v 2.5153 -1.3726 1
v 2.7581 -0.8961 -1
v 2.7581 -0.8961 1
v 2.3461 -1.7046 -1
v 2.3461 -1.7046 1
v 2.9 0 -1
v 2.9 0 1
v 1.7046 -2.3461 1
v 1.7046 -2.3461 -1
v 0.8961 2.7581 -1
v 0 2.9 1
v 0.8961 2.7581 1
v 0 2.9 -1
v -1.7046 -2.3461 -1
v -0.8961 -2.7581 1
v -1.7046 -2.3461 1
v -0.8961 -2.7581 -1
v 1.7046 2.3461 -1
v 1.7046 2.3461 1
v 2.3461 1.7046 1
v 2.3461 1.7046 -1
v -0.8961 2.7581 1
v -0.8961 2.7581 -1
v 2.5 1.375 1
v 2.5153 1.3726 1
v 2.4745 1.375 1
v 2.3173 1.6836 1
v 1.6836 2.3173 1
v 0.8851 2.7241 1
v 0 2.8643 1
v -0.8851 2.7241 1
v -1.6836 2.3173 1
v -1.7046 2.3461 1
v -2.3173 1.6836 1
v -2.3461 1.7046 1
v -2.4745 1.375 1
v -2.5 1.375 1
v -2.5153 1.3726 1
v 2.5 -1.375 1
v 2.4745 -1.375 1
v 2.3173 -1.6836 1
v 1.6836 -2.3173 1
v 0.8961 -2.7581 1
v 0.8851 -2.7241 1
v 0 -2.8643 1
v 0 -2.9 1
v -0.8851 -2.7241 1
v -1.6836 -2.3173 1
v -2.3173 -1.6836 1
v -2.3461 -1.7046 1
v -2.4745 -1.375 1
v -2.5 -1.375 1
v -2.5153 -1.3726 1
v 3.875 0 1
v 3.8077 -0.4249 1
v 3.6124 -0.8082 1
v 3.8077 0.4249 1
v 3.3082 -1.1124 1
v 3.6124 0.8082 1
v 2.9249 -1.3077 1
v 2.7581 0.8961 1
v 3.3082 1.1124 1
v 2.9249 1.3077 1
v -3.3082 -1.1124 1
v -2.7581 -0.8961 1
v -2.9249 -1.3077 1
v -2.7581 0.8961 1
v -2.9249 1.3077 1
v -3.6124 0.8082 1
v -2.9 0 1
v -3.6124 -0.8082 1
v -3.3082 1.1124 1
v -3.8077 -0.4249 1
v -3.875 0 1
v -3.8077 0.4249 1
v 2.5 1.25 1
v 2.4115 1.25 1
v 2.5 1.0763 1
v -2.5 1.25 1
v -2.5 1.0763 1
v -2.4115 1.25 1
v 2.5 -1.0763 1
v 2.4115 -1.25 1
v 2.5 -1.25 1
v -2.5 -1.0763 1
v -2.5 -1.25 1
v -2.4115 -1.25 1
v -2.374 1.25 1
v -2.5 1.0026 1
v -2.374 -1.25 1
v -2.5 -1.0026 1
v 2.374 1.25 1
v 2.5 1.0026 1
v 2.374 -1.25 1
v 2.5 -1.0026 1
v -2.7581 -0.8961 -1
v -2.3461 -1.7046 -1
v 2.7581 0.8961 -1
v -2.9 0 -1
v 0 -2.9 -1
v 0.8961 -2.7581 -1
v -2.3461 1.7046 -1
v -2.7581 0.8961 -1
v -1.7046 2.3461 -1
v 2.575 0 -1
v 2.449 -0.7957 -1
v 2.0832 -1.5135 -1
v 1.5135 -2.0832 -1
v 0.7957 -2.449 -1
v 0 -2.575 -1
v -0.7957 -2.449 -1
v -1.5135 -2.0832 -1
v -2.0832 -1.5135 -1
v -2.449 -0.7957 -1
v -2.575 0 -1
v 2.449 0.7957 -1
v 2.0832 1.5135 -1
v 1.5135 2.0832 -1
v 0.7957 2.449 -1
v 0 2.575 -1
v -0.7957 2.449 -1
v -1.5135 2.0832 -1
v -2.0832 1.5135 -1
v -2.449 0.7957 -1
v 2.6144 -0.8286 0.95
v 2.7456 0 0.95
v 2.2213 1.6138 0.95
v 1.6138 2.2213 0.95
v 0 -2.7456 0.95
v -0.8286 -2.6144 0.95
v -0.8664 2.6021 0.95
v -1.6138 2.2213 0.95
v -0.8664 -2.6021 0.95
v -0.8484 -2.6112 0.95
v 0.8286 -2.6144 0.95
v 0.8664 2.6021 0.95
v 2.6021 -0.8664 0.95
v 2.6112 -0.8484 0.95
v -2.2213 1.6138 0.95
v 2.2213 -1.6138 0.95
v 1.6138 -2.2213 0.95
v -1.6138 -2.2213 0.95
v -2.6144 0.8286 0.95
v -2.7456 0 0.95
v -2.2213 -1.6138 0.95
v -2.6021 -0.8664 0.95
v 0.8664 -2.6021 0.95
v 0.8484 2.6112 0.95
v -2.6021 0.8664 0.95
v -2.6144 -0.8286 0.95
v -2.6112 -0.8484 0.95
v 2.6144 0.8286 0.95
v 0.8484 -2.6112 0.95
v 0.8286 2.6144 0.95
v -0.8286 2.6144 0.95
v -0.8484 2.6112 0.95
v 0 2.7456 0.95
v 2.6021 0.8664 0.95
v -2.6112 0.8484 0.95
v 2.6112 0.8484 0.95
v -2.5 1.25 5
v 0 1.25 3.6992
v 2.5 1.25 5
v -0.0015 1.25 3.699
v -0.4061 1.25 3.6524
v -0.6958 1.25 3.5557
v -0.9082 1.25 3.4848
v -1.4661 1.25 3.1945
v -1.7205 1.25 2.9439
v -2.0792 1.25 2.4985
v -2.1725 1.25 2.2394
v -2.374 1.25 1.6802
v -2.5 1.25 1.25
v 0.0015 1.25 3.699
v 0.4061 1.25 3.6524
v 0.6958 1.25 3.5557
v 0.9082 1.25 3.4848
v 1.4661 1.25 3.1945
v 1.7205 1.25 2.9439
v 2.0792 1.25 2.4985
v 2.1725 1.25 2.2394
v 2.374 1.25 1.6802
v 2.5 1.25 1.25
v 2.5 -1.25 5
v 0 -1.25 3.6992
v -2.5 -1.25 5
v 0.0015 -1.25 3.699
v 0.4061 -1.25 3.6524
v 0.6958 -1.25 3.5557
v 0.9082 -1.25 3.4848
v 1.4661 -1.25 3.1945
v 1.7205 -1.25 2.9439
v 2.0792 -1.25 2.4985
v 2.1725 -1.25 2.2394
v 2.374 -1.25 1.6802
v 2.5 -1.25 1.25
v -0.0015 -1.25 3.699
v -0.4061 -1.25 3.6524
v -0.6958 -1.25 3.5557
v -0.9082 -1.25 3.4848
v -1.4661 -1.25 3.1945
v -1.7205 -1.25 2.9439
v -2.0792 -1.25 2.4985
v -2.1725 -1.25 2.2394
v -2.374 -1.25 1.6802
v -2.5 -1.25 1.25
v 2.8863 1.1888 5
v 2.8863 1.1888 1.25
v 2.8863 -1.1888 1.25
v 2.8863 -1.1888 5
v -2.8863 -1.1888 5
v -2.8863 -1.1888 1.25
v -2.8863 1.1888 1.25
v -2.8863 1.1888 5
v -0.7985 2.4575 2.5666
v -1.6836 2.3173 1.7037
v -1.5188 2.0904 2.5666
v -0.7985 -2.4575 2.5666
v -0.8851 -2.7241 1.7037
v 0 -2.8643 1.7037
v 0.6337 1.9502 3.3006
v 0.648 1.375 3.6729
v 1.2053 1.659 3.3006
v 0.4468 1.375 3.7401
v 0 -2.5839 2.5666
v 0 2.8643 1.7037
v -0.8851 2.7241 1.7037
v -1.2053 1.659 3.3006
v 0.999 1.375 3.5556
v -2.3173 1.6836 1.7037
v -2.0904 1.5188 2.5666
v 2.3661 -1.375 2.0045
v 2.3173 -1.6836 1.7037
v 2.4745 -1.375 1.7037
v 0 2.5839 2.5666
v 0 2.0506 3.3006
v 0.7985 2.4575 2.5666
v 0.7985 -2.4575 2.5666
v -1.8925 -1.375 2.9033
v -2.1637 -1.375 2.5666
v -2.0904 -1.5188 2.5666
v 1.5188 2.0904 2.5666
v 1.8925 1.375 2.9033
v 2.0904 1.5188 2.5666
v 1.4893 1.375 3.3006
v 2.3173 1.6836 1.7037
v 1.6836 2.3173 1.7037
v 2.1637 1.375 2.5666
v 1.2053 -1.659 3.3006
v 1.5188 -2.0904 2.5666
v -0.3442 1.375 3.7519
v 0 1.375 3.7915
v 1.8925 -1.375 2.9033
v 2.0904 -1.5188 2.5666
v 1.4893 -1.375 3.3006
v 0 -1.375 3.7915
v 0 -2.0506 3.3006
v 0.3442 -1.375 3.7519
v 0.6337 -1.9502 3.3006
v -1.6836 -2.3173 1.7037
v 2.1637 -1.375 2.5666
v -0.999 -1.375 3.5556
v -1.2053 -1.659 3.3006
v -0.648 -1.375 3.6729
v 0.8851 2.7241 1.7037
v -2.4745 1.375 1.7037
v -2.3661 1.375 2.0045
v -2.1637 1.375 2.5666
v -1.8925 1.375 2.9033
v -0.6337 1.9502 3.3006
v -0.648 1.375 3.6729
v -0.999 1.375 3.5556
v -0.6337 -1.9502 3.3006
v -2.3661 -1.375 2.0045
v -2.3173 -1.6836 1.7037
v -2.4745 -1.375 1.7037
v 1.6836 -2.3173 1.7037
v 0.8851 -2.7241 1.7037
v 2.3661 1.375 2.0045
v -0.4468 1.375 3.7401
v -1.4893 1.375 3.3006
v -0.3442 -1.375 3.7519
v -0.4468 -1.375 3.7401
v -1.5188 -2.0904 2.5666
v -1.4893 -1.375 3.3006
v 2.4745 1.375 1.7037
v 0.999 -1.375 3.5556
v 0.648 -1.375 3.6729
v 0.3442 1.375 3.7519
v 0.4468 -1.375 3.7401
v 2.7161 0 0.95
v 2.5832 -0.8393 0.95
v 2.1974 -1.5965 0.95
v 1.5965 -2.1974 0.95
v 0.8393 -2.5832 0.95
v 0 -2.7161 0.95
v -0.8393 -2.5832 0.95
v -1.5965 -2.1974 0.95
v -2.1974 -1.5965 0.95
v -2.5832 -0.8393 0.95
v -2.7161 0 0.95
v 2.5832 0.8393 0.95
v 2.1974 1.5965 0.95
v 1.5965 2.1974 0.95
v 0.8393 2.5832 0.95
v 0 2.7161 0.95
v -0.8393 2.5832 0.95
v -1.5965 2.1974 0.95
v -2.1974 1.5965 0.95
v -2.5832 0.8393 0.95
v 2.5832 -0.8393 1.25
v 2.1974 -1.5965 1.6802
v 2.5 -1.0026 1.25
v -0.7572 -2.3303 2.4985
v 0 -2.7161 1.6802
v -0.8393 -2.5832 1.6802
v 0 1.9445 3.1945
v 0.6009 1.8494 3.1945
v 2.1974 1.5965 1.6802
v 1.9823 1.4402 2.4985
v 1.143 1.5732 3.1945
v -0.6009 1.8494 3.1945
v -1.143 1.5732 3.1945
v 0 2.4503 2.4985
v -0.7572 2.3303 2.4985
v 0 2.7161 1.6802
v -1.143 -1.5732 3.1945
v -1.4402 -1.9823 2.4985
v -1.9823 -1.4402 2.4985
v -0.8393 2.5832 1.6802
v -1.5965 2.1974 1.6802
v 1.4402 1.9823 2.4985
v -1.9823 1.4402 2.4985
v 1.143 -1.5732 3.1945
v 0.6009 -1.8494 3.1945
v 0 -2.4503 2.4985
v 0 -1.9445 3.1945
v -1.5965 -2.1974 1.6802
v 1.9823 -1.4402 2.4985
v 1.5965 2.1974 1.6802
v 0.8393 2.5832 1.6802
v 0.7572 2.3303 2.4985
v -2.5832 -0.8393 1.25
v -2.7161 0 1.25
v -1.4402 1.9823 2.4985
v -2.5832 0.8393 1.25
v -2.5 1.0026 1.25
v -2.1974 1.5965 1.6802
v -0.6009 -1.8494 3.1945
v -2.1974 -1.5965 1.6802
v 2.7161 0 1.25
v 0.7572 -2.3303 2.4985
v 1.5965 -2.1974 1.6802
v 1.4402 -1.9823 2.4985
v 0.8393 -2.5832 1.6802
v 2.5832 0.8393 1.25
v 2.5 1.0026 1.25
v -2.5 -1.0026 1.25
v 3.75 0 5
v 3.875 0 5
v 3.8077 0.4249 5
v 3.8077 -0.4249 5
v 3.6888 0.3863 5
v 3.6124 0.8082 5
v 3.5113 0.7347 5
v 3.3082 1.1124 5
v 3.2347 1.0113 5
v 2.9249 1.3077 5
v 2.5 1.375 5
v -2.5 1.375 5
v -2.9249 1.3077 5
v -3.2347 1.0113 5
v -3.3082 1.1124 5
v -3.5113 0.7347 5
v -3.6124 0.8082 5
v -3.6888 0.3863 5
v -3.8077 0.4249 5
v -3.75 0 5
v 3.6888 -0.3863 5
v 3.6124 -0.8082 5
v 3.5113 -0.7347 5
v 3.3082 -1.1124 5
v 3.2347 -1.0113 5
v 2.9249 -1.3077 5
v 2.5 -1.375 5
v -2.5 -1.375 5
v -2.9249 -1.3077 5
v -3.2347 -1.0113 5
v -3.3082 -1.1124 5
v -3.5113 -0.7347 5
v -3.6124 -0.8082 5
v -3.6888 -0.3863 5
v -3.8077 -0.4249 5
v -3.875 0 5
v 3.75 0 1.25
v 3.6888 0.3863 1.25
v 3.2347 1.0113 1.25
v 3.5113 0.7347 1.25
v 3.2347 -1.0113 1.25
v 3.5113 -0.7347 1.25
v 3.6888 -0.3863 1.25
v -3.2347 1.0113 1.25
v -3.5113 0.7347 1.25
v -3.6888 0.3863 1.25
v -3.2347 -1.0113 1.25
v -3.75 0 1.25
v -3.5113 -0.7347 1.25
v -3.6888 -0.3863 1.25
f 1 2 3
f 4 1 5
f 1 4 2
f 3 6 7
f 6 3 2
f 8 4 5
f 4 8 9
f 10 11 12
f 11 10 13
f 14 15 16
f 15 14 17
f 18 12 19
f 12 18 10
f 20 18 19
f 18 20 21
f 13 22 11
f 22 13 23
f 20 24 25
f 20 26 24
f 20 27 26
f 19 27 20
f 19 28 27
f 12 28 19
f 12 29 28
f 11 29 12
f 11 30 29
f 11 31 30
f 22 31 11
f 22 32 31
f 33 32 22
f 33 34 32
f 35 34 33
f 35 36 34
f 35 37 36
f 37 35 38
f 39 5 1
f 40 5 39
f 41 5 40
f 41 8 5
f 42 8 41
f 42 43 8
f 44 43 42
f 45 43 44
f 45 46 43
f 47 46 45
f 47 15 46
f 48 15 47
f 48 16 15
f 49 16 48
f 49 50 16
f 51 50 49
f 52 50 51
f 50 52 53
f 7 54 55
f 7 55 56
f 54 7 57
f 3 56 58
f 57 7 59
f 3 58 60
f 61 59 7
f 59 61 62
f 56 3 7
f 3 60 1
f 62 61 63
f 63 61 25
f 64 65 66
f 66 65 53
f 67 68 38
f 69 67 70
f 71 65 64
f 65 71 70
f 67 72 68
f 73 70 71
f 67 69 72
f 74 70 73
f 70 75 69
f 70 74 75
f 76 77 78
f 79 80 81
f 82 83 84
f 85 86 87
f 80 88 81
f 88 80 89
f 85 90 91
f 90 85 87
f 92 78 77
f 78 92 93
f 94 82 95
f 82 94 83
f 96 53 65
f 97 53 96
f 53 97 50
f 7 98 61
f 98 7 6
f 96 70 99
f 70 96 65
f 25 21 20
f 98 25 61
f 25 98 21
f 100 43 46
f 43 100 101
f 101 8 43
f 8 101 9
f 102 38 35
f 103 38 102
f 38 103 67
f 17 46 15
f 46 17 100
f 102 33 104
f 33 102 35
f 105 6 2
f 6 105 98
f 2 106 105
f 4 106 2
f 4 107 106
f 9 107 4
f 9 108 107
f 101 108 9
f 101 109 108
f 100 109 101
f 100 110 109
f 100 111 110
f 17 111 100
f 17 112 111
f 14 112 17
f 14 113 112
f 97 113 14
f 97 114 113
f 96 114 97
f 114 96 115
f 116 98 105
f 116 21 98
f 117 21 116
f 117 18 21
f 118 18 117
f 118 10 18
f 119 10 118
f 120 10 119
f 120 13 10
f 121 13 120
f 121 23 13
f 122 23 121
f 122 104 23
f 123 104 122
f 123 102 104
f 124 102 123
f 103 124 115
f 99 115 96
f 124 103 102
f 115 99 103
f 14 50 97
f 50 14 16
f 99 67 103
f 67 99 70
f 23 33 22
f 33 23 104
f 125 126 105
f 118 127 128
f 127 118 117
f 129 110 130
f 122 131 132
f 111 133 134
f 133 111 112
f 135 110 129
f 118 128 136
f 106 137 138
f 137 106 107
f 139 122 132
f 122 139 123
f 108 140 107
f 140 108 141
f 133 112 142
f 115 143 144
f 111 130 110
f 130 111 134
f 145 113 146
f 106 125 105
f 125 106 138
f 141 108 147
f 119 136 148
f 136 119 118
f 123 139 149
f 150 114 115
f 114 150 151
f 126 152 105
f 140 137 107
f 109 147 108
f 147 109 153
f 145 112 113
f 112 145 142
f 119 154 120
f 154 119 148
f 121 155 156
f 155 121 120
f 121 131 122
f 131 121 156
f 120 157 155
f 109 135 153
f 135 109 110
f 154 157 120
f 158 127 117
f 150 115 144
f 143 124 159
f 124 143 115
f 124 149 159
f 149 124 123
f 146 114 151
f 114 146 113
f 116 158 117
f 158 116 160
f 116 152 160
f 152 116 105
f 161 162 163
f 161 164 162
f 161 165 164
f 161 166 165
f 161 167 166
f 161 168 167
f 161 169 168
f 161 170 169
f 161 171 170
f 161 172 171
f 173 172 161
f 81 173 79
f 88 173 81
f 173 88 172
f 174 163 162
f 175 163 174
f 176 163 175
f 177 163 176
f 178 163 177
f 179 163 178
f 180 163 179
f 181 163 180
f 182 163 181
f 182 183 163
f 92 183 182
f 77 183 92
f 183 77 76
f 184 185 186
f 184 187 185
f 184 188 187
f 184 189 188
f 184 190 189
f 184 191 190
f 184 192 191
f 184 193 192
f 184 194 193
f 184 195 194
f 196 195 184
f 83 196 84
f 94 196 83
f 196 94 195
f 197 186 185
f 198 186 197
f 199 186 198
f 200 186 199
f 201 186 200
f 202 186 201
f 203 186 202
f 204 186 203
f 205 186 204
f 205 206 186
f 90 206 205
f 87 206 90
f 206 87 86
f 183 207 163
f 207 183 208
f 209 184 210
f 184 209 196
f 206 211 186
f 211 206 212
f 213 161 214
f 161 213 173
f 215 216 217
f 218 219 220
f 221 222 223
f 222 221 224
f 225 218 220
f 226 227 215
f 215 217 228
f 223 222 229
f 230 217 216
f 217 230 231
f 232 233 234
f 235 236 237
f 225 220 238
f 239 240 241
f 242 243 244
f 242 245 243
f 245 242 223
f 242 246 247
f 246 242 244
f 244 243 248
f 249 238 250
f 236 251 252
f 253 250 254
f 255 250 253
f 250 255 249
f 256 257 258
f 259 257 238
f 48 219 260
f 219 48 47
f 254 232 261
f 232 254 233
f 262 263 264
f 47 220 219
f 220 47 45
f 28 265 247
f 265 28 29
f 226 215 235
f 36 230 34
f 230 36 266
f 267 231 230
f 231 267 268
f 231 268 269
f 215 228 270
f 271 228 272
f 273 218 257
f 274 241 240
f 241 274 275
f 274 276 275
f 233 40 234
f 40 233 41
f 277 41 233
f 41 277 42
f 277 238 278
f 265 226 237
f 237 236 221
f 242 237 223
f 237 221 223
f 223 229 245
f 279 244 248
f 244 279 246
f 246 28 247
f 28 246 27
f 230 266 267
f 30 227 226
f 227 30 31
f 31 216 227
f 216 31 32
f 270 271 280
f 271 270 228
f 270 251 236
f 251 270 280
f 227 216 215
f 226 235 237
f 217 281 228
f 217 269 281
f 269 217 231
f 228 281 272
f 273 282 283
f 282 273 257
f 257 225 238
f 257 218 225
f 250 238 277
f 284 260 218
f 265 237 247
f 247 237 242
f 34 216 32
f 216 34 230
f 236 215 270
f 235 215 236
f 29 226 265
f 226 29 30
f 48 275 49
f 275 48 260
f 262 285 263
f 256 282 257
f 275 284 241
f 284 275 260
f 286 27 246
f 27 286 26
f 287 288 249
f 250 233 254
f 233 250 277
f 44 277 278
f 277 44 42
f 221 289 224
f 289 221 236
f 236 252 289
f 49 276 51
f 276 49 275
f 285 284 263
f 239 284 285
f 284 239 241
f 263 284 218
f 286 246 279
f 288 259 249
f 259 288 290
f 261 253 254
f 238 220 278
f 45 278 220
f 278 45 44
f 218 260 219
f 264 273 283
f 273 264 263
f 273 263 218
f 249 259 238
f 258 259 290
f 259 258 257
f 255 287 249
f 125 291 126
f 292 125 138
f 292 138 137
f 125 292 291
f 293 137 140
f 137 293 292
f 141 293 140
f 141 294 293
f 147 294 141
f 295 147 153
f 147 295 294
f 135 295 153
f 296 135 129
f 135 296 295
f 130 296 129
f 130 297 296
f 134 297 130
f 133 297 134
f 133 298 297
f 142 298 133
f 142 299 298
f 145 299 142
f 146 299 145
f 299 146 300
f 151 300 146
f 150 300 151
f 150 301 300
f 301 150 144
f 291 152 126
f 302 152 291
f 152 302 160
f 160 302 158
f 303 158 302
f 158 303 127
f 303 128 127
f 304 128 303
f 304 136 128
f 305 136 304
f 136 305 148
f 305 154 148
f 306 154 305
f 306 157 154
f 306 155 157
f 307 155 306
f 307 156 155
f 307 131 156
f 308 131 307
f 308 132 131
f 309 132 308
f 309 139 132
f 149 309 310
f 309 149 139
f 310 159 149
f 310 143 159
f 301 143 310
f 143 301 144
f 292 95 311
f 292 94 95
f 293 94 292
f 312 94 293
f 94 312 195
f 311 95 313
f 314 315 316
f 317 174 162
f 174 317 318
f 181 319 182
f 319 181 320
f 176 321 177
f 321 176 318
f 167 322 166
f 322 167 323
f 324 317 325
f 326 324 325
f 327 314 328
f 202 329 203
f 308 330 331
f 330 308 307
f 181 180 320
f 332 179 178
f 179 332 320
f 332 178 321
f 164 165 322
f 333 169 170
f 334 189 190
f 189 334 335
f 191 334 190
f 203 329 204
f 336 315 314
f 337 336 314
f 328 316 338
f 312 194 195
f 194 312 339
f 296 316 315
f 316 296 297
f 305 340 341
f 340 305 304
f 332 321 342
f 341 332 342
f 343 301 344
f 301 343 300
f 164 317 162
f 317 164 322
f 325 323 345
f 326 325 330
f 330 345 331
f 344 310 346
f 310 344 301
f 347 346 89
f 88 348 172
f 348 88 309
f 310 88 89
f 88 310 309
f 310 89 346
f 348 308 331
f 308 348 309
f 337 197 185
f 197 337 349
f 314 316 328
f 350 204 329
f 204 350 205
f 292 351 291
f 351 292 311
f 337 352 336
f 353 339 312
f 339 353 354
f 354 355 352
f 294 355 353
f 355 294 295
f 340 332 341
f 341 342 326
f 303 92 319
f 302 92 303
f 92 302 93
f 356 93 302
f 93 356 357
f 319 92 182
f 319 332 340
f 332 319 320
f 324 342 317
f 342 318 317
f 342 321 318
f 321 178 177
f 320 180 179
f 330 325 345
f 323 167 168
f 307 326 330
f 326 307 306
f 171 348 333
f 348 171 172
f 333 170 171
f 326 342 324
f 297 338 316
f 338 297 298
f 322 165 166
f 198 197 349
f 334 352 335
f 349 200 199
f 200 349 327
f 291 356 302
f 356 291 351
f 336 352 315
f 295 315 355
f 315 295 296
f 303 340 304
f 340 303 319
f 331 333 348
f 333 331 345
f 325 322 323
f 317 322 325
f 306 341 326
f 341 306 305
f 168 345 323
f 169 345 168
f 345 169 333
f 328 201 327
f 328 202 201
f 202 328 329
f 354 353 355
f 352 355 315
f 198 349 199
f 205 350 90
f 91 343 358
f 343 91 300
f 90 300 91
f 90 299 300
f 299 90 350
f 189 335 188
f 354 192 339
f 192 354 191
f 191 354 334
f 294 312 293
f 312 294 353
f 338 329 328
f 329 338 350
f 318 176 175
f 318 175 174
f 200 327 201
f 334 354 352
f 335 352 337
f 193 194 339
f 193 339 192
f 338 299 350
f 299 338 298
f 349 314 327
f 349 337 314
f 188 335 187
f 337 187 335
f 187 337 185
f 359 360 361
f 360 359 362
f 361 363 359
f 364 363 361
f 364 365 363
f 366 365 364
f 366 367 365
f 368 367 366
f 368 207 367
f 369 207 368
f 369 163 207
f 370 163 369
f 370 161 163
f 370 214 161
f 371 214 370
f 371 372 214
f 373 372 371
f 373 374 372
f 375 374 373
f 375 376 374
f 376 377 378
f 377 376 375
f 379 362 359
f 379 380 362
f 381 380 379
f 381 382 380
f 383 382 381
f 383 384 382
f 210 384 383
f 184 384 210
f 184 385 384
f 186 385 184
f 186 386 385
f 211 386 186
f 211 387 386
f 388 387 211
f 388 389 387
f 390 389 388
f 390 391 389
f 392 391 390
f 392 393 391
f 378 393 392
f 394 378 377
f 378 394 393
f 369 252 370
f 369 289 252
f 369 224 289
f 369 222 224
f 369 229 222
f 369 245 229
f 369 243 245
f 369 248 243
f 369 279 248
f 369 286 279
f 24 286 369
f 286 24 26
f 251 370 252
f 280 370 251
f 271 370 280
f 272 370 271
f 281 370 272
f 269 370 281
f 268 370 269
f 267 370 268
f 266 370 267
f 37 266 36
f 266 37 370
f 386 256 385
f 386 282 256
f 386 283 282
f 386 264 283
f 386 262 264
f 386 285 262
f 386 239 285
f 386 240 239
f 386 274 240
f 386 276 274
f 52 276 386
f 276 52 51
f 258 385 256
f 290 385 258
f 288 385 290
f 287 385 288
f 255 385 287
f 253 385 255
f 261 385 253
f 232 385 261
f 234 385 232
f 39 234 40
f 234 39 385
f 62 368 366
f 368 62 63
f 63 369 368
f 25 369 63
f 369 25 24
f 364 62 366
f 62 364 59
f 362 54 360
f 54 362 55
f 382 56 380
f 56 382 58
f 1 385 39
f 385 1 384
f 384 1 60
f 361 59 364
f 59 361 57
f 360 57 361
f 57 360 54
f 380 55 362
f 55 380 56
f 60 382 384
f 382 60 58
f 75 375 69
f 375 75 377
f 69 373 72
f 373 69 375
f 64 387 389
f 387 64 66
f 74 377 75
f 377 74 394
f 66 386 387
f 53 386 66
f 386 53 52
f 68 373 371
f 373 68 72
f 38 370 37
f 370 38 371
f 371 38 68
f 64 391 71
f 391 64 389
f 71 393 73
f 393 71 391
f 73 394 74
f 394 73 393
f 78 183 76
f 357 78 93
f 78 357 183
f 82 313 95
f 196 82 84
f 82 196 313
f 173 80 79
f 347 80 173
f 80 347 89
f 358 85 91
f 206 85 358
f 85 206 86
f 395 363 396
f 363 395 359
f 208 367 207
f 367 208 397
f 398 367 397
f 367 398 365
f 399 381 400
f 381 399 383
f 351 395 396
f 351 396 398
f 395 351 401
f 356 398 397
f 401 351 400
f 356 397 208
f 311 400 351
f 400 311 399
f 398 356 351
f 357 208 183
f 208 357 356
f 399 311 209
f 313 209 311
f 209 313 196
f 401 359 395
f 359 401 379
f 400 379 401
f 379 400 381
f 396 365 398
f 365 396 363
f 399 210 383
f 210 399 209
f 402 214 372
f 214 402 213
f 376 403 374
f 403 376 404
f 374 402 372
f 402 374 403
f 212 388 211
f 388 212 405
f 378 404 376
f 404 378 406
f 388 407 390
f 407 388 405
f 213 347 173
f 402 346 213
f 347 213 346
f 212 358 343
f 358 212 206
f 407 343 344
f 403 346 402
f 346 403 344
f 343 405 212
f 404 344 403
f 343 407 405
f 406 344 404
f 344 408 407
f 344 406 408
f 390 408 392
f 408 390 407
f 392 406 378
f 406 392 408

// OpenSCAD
/*
Title: Baffle Fan Attachment
Copyright: Jet Flener 2024
Author: Jet Flener - jetflener@ou.edu
License: GNU GPL v3
Encoding: UTF-8
Version: 0.1.0-alpha
Description: A concentrator attachment for the TWST Baffle.

This code has units in cm. Rescale for printing.
*/


module concentrator() {
    //fitting for duct, interior diameter of 5.15 cm (slightly larger than 2 in)
    
    rotate([180,0,0])difference(){
        cylinder(h=2, d=5.8, center=true);
        cylinder(h=2, d1=5.5, d2=5.15, center=true);
    }
    
    
    //dome thing
    difference(){
        //outer
        translate([0,0,1.25])sphere(d=5.8);
        translate([0,0,-0.5])cylinder(h=2.9, d=5.8, center=true);
        
        //inner
        translate([0,0,1.25])sphere(d=5.5);
        translate([0,0,-0.5])cylinder(h=2.75, d=5.5, center=true);
  
        translate([0,0,3])rotate([0,90,0])union(){
            translate([0, 0, 0])cube([4, 2.5, 5], center=true);
            translate([0, 0, 2.5]) rotate([90, 0, 90]) cylinder(h=4, r=1.25, center=true);
            translate([0, 0, -2.5]) rotate([90, 0, 90]) cylinder(h=4, r=1.25, center=true);
        }
        
    }
    
    //slice for extention
    difference(){
        
        //main part
        translate([0,0,3])rotate([0,90,0])union(){
            translate([0, 0, 0])cube([4, 2.75, 5], center=true);
    
            translate([0, 0, 2.5]) rotate([90, 0, 90]) cylinder(h=4, r=1.375, center=true);
            translate([0, 0, -2.5]) rotate([90, 0, 90]) cylinder(h=4, r=1.375, center=true);
        }
        
        translate([0,0,3])rotate([0,90,0])union(){
            translate([0, 0, 0])cube([4, 2.5, 5], center=true);
           translate([-.25, 0, 2.5]) rotate([90, 0, 90]) cylinder(h=4, r=1.25, center=true);
            translate([-0.25, 0, -2.5]) rotate([90, 0, 90]) cylinder(h=4, r=1.25, center=true);
        }
        
        //cut inside sphere
        translate([0,0,1.25])sphere(d=5.5);
        translate([0,0,-0.5])cylinder(h=2.75, d=5.5, center=true);
  
    }
    
    //cut excess(tbd)
     
    
    $fn = 20;
    
}

render() {
    concentrator();
}
